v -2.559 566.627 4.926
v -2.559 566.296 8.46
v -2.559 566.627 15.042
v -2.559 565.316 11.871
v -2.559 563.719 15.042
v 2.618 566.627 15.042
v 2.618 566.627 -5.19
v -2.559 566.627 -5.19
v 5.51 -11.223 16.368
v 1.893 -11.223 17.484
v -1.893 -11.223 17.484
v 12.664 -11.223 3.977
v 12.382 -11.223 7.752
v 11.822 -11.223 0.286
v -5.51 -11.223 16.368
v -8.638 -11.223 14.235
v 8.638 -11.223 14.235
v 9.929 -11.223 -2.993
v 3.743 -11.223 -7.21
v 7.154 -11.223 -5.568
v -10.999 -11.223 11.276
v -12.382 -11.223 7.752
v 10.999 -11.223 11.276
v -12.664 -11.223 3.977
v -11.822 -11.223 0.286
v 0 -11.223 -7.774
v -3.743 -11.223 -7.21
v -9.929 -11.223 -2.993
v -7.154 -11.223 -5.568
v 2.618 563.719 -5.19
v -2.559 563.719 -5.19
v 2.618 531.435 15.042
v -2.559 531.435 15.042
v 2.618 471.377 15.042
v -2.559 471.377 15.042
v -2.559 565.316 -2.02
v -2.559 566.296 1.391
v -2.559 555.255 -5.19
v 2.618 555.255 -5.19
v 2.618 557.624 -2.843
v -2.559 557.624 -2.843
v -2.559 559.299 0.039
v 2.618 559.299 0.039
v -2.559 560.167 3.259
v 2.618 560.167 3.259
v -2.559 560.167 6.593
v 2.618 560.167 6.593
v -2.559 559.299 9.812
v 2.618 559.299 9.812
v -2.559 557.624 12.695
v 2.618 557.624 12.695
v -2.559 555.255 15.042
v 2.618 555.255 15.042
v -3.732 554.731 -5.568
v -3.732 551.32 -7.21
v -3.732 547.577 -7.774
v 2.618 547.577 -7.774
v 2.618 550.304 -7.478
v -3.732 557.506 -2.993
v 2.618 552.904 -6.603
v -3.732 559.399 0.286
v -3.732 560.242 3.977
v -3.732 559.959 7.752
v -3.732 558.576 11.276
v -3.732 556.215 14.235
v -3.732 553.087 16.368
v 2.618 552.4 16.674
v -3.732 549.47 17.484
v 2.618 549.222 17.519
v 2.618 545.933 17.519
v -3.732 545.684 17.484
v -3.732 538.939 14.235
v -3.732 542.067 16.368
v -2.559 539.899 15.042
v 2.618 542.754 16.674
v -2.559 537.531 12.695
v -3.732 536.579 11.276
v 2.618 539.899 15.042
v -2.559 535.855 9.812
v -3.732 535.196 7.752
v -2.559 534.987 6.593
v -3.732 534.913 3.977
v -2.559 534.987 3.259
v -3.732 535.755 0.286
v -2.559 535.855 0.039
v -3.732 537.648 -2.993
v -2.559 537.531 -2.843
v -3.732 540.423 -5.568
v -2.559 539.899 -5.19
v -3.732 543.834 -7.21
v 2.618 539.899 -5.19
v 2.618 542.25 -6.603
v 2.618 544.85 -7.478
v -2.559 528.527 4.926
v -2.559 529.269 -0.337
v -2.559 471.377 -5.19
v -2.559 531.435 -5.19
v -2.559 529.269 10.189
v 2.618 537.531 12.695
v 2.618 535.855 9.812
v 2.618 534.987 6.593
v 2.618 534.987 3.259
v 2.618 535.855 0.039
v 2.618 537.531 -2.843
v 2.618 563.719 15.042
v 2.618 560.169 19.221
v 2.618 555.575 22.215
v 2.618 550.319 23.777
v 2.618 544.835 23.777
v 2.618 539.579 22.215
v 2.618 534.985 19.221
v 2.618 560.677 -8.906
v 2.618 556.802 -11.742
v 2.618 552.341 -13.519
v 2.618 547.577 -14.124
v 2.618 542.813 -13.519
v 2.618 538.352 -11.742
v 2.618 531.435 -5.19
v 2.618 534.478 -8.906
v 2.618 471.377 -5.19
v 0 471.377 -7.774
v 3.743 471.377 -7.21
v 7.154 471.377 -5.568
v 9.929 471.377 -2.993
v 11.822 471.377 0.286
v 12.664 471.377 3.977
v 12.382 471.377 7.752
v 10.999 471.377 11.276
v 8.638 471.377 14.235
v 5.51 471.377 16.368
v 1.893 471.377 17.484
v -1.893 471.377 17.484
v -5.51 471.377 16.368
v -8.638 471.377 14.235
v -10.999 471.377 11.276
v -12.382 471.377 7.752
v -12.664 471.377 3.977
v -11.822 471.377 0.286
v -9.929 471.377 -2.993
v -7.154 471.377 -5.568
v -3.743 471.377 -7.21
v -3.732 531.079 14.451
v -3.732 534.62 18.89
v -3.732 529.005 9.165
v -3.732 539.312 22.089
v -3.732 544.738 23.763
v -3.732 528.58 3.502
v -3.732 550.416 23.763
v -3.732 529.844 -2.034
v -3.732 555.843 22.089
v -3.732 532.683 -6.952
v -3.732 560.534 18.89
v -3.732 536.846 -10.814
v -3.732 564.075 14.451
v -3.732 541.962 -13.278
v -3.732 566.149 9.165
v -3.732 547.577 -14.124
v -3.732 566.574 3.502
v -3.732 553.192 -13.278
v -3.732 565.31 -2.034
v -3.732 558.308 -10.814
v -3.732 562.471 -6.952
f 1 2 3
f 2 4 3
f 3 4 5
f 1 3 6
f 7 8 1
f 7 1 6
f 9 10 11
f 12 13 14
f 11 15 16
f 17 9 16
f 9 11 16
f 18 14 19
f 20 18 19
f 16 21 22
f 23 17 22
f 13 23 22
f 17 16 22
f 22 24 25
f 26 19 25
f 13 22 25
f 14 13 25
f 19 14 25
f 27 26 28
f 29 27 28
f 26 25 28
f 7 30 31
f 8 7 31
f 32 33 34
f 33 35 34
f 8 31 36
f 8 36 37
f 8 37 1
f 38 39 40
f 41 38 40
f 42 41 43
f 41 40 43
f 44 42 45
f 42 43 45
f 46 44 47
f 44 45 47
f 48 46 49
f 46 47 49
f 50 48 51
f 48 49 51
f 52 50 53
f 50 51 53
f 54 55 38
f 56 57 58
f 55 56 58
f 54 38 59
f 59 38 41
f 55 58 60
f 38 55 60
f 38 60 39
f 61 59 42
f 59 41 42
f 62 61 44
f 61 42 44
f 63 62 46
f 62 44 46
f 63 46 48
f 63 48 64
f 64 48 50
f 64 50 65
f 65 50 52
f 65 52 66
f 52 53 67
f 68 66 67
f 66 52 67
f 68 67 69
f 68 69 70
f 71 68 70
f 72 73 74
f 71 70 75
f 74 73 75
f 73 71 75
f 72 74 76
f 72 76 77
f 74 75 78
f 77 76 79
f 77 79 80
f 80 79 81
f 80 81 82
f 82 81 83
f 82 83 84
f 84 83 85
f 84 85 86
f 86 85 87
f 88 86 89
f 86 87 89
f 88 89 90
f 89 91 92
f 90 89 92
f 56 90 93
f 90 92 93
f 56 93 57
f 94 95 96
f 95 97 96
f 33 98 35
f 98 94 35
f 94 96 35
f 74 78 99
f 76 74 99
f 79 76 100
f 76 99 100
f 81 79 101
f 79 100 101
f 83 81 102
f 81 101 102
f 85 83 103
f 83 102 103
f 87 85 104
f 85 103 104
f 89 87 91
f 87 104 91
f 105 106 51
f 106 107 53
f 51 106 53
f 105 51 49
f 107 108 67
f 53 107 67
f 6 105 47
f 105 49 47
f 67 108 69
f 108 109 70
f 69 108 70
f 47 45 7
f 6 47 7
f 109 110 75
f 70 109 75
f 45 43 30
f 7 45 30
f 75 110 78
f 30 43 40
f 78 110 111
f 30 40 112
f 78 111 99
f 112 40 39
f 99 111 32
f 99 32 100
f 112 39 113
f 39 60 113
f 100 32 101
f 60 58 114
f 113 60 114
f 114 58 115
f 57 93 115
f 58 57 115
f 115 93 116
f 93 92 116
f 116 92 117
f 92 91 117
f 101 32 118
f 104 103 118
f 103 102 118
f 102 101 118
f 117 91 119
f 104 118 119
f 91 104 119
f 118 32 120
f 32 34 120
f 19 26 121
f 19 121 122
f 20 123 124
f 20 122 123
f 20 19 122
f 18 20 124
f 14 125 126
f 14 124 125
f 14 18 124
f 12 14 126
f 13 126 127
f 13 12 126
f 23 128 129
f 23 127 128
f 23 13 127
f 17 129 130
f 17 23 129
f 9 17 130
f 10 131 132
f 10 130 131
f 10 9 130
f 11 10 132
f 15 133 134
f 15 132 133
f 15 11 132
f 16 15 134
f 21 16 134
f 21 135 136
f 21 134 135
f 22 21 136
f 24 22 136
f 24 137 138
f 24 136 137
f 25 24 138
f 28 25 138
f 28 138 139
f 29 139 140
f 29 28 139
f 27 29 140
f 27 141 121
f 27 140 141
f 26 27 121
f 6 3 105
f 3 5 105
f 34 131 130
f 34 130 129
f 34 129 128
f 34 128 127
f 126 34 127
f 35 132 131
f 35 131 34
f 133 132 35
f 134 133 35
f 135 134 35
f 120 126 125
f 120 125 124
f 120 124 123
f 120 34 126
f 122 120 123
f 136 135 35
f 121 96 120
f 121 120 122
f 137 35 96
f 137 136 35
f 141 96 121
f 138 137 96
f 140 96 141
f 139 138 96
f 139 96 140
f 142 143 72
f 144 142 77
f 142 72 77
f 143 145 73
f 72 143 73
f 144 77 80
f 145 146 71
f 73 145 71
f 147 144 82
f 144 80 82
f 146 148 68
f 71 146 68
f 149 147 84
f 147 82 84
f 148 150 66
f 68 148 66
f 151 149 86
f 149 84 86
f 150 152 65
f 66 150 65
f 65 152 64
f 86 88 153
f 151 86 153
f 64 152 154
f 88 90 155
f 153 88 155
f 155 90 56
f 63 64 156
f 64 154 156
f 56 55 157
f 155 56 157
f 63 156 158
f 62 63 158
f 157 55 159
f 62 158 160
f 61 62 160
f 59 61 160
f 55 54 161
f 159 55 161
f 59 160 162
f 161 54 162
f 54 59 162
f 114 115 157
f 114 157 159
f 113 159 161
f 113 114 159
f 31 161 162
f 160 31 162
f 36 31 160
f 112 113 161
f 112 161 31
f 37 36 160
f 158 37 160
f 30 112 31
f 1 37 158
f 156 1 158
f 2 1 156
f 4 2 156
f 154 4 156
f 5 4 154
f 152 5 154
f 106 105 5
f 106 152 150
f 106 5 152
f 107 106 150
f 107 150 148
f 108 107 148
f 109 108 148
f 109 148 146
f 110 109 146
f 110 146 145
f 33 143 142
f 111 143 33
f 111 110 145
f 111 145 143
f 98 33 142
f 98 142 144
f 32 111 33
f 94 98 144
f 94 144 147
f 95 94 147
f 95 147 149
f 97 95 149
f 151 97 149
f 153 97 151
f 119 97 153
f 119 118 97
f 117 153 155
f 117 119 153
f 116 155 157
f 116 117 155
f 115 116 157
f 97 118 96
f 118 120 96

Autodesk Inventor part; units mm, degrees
ref_plane "YZ Plane" through (0, 0, 0) normal (1, 0, 0) x (0, 1, 0)
ref_plane "XZ Plane" through (0, 0, 0) normal (0, 1, 0) x (-1, 0, 0)
ref_plane "XY Plane" through (0, 0, 0) normal (0, 0, 1) x (1, 0, 0)
sketch "Sketch1" plane through (0, 0, 0) normal (1, 0, 0) x (0, 1, 0)
  line L0 (-11.2229, 4.9257) -> (471.3771, 4.9257)
  line L1 (471.3771, 4.9257) -> (471.3771, -7.7743)
  line L2 (471.3771, -7.7743) -> (-11.2229, -7.7743)
  line L3 (-11.2229, -7.7743) -> (-11.2229, 4.9257)
  point P0 (0, 0)
  dimension "d0" = 482.6
revolve "Revolution1" add sketch "Sketch1" angle 360 about axis through (0, -11.2229, 4.9257) along (0, 1, 0)
sketch "Sketch2" plane through (0, 471.3771, 4.9257) normal (0, 1, 0) x (1, 0, 0)
  line L0 (-2.5588, -10.1161) -> (2.6183, -10.1161)
  line L1 (2.6183, -10.1161) -> (2.6183, 10.1161)
  line L2 (2.6183, 10.1161) -> (-2.5588, 10.1161)
  line L3 (-2.5588, 10.1161) -> (-2.5588, -10.1161)
  line L4 (-2.5588, 0) -> (2.6183, 0)
  point P0 (0, 4.9257)
extrude "Extrusion1" add sketch "Sketch2" along normal blind 95.25
sketch "Sketch3" plane through (2.6183, 471.3771, 15.0418) normal (1, 0, 0) x (0, 0, -1)
  line L0 (20.2322, 0) -> (0, 0) projected
  line L1 (20.2322, 0) -> (20.2322, 95.25) projected
  line L2 (0, 95.25) -> (20.2322, 95.25) projected
  line L3 (0, 0) -> (0, 95.25) projected
  line L4 (-2.5839, 0) -> (22.8161, 0) projected
  line L5 (10.1161, 0) -> (10.1161, 76.2)
  circle A0 centre (10.1161, 76.2) radius 12.7
  circle A1 centre (10.1161, 76.2) radius 19.05
  point P0 (15.0418, -471.3771)
  dimension "d10" = 76.2
  dimension "d11" = 25.4
  dimension "d12" = 38.1
extrude "Extrusion2" add sketch "Sketch3" against normal blind 6.35 contours A1 L5 A0 L1 | L1 A0 A1 | A1 L3 A0 L5 | A1 L3 A0 | A0 L3 A1 L1
sketch "Sketch4" plane through (2.6183, 471.3771, 15.0418) normal (1, 0, 0) x (0, 0, -1)
  line L0 (20.2322, 68.5218) -> (20.2322, 83.8782) projected
  arc A0 (20.2322, 68.5218) -> (20.2322, 83.8782) centre (10.1161, 76.2) ccw projected
  arc A1 (20.2322, 60.0579) -> (20.2322, 92.3421) centre (10.1161, 76.2) ccw projected
  line L1 (20.2322, 92.3421) -> (20.2322, 95.25) projected
  line L2 (0, 95.25) -> (20.2322, 95.25) projected
  line L3 (0, 92.3421) -> (0, 95.25) projected
  arc A2 (0, 92.3421) -> (0, 60.0579) centre (10.1161, 76.2) ccw projected
  line L4 (0, 0) -> (0, 60.0579) projected
  line L5 (20.2322, 0) -> (0, 0) projected
  line L6 (20.2322, 0) -> (20.2322, 60.0579) projected
  arc A3 (0, 83.8782) -> (0, 68.5218) centre (10.1161, 76.2) ccw projected
  line L7 (0, 68.5218) -> (0, 83.8782) projected
  arc A4 (0, 83.8782) -> (0, 68.5218) centre (10.1161, 76.2) ccw projected
  arc A5 (20.2322, 83.8782) -> (0, 83.8782) centre (10.1161, 76.2) ccw projected
  arc A6 (20.2322, 68.5218) -> (20.2322, 83.8782) centre (10.1161, 76.2) ccw projected
  arc A7 (0, 68.5218) -> (20.2322, 68.5218) centre (10.1161, 76.2) ccw projected
  circle A8 centre (10.1161, 76.2) radius 12.7
  point P0 (15.0418, -471.3771)
extrude "Extrusion3" cut sketch "Sketch4" against normal blind 6.35 contours A7 L7 A5 L0 | L0 A0 | A3 L7
properties part number "Rod"
